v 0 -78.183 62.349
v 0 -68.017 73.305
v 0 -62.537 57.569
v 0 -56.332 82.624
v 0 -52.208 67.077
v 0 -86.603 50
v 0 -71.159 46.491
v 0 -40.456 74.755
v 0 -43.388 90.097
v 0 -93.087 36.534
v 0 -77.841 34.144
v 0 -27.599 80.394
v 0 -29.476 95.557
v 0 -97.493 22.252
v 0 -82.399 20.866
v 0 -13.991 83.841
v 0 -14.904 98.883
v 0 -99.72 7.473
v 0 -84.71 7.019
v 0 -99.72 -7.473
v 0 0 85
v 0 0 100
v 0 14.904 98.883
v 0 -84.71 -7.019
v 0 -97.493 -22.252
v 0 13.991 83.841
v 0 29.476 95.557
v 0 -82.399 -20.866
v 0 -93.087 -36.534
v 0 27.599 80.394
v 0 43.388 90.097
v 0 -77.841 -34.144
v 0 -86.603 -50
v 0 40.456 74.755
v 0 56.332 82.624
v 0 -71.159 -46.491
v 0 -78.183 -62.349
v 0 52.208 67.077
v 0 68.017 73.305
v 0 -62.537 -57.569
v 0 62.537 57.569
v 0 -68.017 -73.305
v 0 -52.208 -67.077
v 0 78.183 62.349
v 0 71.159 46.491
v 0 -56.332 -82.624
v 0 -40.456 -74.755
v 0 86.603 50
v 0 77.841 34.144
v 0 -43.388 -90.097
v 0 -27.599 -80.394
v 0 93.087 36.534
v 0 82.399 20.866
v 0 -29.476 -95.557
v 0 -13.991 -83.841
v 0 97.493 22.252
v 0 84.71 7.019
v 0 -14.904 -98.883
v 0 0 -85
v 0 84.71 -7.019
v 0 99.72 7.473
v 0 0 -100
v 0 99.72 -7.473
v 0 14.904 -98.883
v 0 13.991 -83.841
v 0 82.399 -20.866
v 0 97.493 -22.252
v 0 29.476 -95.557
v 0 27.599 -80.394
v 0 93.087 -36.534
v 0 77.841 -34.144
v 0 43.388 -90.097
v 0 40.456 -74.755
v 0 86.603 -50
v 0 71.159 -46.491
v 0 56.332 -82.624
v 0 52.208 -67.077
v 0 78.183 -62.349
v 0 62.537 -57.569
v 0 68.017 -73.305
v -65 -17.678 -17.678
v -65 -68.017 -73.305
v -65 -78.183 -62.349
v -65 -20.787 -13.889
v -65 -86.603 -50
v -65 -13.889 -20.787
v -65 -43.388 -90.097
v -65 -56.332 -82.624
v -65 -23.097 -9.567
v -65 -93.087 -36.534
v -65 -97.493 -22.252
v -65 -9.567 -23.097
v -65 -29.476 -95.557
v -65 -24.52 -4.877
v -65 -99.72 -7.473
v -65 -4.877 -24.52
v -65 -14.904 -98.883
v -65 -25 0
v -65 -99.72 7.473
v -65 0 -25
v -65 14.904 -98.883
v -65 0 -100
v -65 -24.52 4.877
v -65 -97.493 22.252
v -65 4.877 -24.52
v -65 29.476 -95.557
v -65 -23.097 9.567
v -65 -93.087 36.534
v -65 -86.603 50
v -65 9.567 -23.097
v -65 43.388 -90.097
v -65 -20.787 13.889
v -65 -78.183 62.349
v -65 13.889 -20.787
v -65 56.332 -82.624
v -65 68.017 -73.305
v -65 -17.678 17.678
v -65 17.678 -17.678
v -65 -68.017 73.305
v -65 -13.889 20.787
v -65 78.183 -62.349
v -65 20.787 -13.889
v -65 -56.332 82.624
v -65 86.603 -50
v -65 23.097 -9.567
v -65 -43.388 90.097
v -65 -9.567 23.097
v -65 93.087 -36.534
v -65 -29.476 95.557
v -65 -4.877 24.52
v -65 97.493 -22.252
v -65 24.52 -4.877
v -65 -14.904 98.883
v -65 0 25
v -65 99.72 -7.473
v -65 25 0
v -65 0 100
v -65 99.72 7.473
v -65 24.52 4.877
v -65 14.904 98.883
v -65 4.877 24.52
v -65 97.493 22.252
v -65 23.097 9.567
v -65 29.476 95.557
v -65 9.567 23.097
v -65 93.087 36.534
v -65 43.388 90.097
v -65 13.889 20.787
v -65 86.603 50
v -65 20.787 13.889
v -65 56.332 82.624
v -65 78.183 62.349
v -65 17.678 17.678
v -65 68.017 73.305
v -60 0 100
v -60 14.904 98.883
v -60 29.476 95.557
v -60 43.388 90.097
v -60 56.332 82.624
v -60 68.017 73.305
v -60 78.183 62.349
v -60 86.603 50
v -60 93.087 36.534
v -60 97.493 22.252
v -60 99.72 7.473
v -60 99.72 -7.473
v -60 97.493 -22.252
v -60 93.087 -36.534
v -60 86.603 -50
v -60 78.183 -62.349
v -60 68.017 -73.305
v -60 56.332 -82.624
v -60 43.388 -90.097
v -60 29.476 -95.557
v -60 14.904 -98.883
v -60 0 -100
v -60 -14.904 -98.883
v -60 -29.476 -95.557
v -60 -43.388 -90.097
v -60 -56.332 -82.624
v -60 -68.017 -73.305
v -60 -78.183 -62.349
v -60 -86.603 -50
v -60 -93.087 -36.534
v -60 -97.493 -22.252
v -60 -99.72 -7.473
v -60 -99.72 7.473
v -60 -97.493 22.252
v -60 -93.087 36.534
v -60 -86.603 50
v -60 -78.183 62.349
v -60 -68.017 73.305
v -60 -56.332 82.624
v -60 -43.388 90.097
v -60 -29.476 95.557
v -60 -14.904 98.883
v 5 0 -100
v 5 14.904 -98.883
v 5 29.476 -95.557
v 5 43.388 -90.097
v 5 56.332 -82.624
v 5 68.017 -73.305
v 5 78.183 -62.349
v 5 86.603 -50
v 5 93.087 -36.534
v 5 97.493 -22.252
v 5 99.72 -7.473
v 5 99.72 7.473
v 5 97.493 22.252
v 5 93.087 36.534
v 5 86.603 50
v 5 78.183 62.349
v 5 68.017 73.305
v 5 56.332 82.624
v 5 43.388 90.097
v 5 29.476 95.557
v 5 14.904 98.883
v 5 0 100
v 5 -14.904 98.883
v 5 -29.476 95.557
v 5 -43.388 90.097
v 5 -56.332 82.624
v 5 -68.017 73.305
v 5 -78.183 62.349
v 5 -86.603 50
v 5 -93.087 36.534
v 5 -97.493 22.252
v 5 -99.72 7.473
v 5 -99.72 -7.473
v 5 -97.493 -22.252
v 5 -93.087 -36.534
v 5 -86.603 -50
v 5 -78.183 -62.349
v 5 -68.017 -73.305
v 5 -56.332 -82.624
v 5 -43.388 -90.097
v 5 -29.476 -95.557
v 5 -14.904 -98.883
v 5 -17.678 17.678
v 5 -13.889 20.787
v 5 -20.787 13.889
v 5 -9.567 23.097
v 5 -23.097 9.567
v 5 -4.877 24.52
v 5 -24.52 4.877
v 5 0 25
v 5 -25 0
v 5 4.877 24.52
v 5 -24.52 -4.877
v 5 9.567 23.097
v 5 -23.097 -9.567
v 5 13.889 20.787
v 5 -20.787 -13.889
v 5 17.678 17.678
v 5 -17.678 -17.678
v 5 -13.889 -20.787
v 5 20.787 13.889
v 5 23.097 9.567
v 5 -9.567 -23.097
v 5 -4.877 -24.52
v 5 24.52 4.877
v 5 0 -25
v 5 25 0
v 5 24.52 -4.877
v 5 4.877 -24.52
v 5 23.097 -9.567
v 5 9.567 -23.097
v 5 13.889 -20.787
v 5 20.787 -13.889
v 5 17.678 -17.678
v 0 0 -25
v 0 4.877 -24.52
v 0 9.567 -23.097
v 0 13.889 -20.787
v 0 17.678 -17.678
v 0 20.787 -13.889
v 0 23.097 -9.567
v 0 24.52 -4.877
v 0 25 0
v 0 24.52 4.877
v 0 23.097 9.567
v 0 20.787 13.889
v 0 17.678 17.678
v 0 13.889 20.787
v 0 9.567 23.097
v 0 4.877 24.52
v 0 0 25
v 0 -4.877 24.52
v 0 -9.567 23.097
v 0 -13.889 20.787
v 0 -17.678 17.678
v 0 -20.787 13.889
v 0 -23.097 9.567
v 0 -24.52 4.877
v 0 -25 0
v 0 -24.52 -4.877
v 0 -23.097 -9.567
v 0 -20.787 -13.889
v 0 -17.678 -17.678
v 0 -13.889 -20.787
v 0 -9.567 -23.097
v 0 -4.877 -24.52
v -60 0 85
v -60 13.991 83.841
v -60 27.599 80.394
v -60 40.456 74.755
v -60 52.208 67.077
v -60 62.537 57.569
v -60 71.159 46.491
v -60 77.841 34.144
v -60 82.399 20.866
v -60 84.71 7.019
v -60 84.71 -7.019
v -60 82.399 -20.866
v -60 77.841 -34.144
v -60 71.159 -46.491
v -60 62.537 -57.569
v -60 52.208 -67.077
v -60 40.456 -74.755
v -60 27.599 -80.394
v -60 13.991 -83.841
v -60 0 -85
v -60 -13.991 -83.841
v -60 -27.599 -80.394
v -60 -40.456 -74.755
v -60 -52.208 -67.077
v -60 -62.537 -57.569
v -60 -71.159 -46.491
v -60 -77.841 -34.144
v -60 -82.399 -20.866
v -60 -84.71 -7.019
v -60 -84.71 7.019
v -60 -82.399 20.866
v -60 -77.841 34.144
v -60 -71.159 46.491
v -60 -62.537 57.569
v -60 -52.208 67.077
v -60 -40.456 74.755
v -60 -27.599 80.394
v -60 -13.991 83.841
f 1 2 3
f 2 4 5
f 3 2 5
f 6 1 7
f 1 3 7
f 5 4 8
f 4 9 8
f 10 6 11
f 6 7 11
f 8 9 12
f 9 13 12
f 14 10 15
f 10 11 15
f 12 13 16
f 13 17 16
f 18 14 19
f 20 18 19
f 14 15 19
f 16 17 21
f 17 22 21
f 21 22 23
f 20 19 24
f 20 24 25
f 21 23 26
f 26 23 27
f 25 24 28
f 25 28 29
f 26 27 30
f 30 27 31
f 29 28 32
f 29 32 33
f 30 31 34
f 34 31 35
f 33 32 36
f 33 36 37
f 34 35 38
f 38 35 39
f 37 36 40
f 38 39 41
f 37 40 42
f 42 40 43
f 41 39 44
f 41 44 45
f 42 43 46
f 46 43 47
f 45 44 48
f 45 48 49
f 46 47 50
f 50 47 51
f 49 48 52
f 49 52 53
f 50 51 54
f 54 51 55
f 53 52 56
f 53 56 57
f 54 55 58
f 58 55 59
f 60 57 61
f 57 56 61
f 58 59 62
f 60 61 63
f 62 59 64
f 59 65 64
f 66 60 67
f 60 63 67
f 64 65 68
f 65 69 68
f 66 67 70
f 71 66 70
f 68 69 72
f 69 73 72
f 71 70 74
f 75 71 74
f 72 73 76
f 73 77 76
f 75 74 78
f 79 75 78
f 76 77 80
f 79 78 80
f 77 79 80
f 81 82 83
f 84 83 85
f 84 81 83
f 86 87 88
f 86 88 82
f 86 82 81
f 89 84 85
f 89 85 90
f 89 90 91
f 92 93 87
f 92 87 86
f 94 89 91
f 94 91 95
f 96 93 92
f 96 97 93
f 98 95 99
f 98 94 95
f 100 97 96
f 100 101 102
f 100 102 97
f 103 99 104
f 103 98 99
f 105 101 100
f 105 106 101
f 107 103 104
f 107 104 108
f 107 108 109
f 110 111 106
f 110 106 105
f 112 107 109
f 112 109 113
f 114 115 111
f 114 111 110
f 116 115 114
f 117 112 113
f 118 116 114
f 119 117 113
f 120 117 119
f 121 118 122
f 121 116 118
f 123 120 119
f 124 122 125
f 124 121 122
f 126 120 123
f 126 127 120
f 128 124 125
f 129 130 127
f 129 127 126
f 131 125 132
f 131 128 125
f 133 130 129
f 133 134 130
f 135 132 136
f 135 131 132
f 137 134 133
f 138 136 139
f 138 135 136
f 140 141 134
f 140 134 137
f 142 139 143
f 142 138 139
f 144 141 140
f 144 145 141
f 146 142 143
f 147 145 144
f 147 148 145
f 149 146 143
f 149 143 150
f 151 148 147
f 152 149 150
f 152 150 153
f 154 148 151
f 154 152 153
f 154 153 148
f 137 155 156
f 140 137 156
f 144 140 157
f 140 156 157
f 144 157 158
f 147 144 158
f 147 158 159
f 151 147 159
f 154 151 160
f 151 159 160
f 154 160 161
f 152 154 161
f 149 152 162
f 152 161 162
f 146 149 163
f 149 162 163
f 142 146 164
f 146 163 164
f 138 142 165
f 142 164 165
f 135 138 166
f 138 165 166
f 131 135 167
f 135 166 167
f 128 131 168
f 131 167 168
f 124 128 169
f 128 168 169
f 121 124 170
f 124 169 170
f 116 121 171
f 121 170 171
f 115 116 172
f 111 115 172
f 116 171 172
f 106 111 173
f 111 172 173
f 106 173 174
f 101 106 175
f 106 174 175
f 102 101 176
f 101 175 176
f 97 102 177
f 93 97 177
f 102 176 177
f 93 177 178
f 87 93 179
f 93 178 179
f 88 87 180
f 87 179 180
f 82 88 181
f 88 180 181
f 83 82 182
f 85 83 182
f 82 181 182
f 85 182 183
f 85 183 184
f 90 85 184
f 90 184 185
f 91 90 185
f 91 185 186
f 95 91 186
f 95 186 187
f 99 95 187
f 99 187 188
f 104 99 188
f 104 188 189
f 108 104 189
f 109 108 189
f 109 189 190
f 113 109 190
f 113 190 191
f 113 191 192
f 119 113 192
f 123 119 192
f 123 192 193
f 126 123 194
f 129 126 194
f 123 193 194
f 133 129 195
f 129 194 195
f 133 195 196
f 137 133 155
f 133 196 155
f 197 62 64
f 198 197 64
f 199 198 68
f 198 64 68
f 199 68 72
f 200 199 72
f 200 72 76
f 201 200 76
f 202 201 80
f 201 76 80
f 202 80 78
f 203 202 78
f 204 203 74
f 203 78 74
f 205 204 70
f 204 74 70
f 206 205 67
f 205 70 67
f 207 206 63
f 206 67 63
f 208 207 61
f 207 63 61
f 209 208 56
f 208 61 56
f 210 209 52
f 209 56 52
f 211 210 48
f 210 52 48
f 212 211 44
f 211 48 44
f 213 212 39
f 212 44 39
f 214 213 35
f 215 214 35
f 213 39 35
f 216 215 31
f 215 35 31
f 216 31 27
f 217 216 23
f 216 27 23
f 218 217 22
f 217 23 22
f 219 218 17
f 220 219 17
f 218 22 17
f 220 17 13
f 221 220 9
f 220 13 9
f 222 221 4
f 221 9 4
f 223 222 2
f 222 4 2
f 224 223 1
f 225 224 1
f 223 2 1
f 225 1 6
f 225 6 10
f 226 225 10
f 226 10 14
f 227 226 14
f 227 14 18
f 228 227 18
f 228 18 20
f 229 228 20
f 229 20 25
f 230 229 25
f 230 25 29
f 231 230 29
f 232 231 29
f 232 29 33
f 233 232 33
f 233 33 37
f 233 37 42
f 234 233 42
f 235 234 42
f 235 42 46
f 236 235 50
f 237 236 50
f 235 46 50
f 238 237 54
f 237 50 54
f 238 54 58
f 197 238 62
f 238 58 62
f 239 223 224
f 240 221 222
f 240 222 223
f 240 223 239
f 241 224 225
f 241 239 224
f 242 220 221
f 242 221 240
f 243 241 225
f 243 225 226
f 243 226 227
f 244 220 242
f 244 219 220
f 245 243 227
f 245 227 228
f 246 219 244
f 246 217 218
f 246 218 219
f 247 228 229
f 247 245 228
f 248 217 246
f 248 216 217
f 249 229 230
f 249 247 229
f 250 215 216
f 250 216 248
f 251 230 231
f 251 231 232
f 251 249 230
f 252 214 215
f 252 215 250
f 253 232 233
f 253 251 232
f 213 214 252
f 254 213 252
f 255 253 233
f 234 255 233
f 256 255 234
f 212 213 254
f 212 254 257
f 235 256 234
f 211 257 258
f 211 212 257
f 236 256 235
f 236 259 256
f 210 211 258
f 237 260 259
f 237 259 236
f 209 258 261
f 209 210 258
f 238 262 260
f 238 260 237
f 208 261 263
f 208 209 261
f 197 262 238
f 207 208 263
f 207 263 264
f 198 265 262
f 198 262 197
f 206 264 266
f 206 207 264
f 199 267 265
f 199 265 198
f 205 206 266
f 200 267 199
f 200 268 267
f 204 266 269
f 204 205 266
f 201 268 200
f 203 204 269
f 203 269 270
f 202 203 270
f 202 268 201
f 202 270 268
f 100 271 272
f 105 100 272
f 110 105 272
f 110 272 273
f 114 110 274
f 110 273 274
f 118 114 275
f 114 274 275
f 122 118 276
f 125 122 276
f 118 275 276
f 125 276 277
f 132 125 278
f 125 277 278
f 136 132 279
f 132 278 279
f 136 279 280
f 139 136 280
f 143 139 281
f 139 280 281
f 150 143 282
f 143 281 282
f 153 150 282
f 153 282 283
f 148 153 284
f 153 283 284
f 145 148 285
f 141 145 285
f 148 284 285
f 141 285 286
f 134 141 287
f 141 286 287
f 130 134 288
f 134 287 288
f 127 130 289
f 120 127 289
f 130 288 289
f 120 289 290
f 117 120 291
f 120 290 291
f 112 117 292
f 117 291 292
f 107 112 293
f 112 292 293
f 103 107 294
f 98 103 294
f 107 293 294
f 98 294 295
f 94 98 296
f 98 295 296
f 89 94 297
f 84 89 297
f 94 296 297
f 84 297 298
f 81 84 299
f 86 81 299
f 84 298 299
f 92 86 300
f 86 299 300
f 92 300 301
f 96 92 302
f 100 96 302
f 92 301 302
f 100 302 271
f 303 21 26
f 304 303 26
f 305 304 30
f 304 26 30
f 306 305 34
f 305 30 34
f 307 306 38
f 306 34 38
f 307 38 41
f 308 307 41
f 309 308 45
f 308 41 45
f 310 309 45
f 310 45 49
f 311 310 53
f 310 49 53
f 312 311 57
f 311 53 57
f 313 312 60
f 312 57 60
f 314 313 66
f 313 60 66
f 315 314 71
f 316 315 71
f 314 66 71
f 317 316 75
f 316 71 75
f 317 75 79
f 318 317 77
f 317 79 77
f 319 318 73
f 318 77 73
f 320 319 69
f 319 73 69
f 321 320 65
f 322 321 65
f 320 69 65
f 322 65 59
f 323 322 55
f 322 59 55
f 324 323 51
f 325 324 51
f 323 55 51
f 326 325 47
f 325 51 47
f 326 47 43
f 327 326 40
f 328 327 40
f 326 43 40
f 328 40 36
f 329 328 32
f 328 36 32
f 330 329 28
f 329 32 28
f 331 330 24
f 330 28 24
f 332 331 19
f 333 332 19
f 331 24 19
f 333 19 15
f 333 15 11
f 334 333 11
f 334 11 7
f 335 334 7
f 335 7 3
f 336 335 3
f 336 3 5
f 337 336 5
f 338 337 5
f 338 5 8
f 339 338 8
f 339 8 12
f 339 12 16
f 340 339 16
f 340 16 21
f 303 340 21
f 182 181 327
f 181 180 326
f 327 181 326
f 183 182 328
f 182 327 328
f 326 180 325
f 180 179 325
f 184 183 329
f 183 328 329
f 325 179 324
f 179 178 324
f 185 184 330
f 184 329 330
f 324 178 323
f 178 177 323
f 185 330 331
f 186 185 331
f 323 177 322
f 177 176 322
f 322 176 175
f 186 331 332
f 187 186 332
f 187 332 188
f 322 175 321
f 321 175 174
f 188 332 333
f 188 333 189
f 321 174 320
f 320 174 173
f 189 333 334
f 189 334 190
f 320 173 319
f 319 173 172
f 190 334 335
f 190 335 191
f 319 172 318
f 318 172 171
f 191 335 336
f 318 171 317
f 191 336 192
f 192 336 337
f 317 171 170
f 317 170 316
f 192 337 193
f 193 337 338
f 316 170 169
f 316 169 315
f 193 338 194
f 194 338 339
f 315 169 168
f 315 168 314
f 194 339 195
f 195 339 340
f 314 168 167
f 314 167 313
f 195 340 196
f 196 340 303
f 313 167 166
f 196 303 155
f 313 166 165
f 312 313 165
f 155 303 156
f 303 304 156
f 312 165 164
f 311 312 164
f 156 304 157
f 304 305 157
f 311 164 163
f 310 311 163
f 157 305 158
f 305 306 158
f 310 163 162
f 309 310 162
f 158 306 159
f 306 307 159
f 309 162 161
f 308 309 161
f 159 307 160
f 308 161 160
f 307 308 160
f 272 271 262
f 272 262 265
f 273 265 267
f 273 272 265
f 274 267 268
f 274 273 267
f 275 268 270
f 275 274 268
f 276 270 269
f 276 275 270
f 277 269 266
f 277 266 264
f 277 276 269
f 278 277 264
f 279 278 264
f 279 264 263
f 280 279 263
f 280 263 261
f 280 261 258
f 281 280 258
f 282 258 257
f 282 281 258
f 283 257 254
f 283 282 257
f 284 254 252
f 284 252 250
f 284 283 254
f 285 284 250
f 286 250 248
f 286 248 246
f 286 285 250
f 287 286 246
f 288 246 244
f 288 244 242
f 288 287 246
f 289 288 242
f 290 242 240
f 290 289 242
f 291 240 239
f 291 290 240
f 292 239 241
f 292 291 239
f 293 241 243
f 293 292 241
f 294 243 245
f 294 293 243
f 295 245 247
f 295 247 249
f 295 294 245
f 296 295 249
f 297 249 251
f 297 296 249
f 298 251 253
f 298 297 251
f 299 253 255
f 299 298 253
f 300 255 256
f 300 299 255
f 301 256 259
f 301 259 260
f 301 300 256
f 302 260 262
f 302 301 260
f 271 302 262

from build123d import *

# Parameters (mm, degrees)
CROQUIS1_R              = 100
CROQUIS1_R_2            = 25
SALIENTE_EXTRUIR1_DEPTH = 5
CROQUIS2_R              = 85
SALIENTE_EXTRUIR2_DEPTH = 60
CROQUIS3_R              = 100
SALIENTE_EXTRUIR3_DEPTH = 5
CROQUIS4_R              = 25
CORTAR_EXTRUIR1_DEPTH   = 65


with BuildPart() as part:
    # Croquis1 → Saliente-Extruir1 (new body)
    with BuildSketch(Plane(origin=(0, 0, 0), x_dir=(0, 0, -1), z_dir=(1, 0, 0))):
        Circle(CROQUIS1_R)
        Circle(CROQUIS1_R_2, mode=Mode.SUBTRACT)
    extrude(amount=SALIENTE_EXTRUIR1_DEPTH)

    # Croquis2 → Saliente-Extruir2 (add)
    with BuildSketch(Plane.ZY):
        Circle(CROQUIS2_R)
    extrude(amount=SALIENTE_EXTRUIR2_DEPTH)

    # Croquis3 → Saliente-Extruir3 (add)
    with BuildSketch(Plane.ZY.offset(60)):
        Circle(CROQUIS3_R)
    extrude(amount=SALIENTE_EXTRUIR3_DEPTH)

    # Croquis4 → Cortar-Extruir1 (cut)
    with BuildSketch(Plane(origin=(0, 0, 0), x_dir=(0, 0, -1), z_dir=(1, 0, 0))):
        Circle(CROQUIS4_R)
    extrude(amount=-CORTAR_EXTRUIR1_DEPTH, mode=Mode.SUBTRACT)


solid = part.part
